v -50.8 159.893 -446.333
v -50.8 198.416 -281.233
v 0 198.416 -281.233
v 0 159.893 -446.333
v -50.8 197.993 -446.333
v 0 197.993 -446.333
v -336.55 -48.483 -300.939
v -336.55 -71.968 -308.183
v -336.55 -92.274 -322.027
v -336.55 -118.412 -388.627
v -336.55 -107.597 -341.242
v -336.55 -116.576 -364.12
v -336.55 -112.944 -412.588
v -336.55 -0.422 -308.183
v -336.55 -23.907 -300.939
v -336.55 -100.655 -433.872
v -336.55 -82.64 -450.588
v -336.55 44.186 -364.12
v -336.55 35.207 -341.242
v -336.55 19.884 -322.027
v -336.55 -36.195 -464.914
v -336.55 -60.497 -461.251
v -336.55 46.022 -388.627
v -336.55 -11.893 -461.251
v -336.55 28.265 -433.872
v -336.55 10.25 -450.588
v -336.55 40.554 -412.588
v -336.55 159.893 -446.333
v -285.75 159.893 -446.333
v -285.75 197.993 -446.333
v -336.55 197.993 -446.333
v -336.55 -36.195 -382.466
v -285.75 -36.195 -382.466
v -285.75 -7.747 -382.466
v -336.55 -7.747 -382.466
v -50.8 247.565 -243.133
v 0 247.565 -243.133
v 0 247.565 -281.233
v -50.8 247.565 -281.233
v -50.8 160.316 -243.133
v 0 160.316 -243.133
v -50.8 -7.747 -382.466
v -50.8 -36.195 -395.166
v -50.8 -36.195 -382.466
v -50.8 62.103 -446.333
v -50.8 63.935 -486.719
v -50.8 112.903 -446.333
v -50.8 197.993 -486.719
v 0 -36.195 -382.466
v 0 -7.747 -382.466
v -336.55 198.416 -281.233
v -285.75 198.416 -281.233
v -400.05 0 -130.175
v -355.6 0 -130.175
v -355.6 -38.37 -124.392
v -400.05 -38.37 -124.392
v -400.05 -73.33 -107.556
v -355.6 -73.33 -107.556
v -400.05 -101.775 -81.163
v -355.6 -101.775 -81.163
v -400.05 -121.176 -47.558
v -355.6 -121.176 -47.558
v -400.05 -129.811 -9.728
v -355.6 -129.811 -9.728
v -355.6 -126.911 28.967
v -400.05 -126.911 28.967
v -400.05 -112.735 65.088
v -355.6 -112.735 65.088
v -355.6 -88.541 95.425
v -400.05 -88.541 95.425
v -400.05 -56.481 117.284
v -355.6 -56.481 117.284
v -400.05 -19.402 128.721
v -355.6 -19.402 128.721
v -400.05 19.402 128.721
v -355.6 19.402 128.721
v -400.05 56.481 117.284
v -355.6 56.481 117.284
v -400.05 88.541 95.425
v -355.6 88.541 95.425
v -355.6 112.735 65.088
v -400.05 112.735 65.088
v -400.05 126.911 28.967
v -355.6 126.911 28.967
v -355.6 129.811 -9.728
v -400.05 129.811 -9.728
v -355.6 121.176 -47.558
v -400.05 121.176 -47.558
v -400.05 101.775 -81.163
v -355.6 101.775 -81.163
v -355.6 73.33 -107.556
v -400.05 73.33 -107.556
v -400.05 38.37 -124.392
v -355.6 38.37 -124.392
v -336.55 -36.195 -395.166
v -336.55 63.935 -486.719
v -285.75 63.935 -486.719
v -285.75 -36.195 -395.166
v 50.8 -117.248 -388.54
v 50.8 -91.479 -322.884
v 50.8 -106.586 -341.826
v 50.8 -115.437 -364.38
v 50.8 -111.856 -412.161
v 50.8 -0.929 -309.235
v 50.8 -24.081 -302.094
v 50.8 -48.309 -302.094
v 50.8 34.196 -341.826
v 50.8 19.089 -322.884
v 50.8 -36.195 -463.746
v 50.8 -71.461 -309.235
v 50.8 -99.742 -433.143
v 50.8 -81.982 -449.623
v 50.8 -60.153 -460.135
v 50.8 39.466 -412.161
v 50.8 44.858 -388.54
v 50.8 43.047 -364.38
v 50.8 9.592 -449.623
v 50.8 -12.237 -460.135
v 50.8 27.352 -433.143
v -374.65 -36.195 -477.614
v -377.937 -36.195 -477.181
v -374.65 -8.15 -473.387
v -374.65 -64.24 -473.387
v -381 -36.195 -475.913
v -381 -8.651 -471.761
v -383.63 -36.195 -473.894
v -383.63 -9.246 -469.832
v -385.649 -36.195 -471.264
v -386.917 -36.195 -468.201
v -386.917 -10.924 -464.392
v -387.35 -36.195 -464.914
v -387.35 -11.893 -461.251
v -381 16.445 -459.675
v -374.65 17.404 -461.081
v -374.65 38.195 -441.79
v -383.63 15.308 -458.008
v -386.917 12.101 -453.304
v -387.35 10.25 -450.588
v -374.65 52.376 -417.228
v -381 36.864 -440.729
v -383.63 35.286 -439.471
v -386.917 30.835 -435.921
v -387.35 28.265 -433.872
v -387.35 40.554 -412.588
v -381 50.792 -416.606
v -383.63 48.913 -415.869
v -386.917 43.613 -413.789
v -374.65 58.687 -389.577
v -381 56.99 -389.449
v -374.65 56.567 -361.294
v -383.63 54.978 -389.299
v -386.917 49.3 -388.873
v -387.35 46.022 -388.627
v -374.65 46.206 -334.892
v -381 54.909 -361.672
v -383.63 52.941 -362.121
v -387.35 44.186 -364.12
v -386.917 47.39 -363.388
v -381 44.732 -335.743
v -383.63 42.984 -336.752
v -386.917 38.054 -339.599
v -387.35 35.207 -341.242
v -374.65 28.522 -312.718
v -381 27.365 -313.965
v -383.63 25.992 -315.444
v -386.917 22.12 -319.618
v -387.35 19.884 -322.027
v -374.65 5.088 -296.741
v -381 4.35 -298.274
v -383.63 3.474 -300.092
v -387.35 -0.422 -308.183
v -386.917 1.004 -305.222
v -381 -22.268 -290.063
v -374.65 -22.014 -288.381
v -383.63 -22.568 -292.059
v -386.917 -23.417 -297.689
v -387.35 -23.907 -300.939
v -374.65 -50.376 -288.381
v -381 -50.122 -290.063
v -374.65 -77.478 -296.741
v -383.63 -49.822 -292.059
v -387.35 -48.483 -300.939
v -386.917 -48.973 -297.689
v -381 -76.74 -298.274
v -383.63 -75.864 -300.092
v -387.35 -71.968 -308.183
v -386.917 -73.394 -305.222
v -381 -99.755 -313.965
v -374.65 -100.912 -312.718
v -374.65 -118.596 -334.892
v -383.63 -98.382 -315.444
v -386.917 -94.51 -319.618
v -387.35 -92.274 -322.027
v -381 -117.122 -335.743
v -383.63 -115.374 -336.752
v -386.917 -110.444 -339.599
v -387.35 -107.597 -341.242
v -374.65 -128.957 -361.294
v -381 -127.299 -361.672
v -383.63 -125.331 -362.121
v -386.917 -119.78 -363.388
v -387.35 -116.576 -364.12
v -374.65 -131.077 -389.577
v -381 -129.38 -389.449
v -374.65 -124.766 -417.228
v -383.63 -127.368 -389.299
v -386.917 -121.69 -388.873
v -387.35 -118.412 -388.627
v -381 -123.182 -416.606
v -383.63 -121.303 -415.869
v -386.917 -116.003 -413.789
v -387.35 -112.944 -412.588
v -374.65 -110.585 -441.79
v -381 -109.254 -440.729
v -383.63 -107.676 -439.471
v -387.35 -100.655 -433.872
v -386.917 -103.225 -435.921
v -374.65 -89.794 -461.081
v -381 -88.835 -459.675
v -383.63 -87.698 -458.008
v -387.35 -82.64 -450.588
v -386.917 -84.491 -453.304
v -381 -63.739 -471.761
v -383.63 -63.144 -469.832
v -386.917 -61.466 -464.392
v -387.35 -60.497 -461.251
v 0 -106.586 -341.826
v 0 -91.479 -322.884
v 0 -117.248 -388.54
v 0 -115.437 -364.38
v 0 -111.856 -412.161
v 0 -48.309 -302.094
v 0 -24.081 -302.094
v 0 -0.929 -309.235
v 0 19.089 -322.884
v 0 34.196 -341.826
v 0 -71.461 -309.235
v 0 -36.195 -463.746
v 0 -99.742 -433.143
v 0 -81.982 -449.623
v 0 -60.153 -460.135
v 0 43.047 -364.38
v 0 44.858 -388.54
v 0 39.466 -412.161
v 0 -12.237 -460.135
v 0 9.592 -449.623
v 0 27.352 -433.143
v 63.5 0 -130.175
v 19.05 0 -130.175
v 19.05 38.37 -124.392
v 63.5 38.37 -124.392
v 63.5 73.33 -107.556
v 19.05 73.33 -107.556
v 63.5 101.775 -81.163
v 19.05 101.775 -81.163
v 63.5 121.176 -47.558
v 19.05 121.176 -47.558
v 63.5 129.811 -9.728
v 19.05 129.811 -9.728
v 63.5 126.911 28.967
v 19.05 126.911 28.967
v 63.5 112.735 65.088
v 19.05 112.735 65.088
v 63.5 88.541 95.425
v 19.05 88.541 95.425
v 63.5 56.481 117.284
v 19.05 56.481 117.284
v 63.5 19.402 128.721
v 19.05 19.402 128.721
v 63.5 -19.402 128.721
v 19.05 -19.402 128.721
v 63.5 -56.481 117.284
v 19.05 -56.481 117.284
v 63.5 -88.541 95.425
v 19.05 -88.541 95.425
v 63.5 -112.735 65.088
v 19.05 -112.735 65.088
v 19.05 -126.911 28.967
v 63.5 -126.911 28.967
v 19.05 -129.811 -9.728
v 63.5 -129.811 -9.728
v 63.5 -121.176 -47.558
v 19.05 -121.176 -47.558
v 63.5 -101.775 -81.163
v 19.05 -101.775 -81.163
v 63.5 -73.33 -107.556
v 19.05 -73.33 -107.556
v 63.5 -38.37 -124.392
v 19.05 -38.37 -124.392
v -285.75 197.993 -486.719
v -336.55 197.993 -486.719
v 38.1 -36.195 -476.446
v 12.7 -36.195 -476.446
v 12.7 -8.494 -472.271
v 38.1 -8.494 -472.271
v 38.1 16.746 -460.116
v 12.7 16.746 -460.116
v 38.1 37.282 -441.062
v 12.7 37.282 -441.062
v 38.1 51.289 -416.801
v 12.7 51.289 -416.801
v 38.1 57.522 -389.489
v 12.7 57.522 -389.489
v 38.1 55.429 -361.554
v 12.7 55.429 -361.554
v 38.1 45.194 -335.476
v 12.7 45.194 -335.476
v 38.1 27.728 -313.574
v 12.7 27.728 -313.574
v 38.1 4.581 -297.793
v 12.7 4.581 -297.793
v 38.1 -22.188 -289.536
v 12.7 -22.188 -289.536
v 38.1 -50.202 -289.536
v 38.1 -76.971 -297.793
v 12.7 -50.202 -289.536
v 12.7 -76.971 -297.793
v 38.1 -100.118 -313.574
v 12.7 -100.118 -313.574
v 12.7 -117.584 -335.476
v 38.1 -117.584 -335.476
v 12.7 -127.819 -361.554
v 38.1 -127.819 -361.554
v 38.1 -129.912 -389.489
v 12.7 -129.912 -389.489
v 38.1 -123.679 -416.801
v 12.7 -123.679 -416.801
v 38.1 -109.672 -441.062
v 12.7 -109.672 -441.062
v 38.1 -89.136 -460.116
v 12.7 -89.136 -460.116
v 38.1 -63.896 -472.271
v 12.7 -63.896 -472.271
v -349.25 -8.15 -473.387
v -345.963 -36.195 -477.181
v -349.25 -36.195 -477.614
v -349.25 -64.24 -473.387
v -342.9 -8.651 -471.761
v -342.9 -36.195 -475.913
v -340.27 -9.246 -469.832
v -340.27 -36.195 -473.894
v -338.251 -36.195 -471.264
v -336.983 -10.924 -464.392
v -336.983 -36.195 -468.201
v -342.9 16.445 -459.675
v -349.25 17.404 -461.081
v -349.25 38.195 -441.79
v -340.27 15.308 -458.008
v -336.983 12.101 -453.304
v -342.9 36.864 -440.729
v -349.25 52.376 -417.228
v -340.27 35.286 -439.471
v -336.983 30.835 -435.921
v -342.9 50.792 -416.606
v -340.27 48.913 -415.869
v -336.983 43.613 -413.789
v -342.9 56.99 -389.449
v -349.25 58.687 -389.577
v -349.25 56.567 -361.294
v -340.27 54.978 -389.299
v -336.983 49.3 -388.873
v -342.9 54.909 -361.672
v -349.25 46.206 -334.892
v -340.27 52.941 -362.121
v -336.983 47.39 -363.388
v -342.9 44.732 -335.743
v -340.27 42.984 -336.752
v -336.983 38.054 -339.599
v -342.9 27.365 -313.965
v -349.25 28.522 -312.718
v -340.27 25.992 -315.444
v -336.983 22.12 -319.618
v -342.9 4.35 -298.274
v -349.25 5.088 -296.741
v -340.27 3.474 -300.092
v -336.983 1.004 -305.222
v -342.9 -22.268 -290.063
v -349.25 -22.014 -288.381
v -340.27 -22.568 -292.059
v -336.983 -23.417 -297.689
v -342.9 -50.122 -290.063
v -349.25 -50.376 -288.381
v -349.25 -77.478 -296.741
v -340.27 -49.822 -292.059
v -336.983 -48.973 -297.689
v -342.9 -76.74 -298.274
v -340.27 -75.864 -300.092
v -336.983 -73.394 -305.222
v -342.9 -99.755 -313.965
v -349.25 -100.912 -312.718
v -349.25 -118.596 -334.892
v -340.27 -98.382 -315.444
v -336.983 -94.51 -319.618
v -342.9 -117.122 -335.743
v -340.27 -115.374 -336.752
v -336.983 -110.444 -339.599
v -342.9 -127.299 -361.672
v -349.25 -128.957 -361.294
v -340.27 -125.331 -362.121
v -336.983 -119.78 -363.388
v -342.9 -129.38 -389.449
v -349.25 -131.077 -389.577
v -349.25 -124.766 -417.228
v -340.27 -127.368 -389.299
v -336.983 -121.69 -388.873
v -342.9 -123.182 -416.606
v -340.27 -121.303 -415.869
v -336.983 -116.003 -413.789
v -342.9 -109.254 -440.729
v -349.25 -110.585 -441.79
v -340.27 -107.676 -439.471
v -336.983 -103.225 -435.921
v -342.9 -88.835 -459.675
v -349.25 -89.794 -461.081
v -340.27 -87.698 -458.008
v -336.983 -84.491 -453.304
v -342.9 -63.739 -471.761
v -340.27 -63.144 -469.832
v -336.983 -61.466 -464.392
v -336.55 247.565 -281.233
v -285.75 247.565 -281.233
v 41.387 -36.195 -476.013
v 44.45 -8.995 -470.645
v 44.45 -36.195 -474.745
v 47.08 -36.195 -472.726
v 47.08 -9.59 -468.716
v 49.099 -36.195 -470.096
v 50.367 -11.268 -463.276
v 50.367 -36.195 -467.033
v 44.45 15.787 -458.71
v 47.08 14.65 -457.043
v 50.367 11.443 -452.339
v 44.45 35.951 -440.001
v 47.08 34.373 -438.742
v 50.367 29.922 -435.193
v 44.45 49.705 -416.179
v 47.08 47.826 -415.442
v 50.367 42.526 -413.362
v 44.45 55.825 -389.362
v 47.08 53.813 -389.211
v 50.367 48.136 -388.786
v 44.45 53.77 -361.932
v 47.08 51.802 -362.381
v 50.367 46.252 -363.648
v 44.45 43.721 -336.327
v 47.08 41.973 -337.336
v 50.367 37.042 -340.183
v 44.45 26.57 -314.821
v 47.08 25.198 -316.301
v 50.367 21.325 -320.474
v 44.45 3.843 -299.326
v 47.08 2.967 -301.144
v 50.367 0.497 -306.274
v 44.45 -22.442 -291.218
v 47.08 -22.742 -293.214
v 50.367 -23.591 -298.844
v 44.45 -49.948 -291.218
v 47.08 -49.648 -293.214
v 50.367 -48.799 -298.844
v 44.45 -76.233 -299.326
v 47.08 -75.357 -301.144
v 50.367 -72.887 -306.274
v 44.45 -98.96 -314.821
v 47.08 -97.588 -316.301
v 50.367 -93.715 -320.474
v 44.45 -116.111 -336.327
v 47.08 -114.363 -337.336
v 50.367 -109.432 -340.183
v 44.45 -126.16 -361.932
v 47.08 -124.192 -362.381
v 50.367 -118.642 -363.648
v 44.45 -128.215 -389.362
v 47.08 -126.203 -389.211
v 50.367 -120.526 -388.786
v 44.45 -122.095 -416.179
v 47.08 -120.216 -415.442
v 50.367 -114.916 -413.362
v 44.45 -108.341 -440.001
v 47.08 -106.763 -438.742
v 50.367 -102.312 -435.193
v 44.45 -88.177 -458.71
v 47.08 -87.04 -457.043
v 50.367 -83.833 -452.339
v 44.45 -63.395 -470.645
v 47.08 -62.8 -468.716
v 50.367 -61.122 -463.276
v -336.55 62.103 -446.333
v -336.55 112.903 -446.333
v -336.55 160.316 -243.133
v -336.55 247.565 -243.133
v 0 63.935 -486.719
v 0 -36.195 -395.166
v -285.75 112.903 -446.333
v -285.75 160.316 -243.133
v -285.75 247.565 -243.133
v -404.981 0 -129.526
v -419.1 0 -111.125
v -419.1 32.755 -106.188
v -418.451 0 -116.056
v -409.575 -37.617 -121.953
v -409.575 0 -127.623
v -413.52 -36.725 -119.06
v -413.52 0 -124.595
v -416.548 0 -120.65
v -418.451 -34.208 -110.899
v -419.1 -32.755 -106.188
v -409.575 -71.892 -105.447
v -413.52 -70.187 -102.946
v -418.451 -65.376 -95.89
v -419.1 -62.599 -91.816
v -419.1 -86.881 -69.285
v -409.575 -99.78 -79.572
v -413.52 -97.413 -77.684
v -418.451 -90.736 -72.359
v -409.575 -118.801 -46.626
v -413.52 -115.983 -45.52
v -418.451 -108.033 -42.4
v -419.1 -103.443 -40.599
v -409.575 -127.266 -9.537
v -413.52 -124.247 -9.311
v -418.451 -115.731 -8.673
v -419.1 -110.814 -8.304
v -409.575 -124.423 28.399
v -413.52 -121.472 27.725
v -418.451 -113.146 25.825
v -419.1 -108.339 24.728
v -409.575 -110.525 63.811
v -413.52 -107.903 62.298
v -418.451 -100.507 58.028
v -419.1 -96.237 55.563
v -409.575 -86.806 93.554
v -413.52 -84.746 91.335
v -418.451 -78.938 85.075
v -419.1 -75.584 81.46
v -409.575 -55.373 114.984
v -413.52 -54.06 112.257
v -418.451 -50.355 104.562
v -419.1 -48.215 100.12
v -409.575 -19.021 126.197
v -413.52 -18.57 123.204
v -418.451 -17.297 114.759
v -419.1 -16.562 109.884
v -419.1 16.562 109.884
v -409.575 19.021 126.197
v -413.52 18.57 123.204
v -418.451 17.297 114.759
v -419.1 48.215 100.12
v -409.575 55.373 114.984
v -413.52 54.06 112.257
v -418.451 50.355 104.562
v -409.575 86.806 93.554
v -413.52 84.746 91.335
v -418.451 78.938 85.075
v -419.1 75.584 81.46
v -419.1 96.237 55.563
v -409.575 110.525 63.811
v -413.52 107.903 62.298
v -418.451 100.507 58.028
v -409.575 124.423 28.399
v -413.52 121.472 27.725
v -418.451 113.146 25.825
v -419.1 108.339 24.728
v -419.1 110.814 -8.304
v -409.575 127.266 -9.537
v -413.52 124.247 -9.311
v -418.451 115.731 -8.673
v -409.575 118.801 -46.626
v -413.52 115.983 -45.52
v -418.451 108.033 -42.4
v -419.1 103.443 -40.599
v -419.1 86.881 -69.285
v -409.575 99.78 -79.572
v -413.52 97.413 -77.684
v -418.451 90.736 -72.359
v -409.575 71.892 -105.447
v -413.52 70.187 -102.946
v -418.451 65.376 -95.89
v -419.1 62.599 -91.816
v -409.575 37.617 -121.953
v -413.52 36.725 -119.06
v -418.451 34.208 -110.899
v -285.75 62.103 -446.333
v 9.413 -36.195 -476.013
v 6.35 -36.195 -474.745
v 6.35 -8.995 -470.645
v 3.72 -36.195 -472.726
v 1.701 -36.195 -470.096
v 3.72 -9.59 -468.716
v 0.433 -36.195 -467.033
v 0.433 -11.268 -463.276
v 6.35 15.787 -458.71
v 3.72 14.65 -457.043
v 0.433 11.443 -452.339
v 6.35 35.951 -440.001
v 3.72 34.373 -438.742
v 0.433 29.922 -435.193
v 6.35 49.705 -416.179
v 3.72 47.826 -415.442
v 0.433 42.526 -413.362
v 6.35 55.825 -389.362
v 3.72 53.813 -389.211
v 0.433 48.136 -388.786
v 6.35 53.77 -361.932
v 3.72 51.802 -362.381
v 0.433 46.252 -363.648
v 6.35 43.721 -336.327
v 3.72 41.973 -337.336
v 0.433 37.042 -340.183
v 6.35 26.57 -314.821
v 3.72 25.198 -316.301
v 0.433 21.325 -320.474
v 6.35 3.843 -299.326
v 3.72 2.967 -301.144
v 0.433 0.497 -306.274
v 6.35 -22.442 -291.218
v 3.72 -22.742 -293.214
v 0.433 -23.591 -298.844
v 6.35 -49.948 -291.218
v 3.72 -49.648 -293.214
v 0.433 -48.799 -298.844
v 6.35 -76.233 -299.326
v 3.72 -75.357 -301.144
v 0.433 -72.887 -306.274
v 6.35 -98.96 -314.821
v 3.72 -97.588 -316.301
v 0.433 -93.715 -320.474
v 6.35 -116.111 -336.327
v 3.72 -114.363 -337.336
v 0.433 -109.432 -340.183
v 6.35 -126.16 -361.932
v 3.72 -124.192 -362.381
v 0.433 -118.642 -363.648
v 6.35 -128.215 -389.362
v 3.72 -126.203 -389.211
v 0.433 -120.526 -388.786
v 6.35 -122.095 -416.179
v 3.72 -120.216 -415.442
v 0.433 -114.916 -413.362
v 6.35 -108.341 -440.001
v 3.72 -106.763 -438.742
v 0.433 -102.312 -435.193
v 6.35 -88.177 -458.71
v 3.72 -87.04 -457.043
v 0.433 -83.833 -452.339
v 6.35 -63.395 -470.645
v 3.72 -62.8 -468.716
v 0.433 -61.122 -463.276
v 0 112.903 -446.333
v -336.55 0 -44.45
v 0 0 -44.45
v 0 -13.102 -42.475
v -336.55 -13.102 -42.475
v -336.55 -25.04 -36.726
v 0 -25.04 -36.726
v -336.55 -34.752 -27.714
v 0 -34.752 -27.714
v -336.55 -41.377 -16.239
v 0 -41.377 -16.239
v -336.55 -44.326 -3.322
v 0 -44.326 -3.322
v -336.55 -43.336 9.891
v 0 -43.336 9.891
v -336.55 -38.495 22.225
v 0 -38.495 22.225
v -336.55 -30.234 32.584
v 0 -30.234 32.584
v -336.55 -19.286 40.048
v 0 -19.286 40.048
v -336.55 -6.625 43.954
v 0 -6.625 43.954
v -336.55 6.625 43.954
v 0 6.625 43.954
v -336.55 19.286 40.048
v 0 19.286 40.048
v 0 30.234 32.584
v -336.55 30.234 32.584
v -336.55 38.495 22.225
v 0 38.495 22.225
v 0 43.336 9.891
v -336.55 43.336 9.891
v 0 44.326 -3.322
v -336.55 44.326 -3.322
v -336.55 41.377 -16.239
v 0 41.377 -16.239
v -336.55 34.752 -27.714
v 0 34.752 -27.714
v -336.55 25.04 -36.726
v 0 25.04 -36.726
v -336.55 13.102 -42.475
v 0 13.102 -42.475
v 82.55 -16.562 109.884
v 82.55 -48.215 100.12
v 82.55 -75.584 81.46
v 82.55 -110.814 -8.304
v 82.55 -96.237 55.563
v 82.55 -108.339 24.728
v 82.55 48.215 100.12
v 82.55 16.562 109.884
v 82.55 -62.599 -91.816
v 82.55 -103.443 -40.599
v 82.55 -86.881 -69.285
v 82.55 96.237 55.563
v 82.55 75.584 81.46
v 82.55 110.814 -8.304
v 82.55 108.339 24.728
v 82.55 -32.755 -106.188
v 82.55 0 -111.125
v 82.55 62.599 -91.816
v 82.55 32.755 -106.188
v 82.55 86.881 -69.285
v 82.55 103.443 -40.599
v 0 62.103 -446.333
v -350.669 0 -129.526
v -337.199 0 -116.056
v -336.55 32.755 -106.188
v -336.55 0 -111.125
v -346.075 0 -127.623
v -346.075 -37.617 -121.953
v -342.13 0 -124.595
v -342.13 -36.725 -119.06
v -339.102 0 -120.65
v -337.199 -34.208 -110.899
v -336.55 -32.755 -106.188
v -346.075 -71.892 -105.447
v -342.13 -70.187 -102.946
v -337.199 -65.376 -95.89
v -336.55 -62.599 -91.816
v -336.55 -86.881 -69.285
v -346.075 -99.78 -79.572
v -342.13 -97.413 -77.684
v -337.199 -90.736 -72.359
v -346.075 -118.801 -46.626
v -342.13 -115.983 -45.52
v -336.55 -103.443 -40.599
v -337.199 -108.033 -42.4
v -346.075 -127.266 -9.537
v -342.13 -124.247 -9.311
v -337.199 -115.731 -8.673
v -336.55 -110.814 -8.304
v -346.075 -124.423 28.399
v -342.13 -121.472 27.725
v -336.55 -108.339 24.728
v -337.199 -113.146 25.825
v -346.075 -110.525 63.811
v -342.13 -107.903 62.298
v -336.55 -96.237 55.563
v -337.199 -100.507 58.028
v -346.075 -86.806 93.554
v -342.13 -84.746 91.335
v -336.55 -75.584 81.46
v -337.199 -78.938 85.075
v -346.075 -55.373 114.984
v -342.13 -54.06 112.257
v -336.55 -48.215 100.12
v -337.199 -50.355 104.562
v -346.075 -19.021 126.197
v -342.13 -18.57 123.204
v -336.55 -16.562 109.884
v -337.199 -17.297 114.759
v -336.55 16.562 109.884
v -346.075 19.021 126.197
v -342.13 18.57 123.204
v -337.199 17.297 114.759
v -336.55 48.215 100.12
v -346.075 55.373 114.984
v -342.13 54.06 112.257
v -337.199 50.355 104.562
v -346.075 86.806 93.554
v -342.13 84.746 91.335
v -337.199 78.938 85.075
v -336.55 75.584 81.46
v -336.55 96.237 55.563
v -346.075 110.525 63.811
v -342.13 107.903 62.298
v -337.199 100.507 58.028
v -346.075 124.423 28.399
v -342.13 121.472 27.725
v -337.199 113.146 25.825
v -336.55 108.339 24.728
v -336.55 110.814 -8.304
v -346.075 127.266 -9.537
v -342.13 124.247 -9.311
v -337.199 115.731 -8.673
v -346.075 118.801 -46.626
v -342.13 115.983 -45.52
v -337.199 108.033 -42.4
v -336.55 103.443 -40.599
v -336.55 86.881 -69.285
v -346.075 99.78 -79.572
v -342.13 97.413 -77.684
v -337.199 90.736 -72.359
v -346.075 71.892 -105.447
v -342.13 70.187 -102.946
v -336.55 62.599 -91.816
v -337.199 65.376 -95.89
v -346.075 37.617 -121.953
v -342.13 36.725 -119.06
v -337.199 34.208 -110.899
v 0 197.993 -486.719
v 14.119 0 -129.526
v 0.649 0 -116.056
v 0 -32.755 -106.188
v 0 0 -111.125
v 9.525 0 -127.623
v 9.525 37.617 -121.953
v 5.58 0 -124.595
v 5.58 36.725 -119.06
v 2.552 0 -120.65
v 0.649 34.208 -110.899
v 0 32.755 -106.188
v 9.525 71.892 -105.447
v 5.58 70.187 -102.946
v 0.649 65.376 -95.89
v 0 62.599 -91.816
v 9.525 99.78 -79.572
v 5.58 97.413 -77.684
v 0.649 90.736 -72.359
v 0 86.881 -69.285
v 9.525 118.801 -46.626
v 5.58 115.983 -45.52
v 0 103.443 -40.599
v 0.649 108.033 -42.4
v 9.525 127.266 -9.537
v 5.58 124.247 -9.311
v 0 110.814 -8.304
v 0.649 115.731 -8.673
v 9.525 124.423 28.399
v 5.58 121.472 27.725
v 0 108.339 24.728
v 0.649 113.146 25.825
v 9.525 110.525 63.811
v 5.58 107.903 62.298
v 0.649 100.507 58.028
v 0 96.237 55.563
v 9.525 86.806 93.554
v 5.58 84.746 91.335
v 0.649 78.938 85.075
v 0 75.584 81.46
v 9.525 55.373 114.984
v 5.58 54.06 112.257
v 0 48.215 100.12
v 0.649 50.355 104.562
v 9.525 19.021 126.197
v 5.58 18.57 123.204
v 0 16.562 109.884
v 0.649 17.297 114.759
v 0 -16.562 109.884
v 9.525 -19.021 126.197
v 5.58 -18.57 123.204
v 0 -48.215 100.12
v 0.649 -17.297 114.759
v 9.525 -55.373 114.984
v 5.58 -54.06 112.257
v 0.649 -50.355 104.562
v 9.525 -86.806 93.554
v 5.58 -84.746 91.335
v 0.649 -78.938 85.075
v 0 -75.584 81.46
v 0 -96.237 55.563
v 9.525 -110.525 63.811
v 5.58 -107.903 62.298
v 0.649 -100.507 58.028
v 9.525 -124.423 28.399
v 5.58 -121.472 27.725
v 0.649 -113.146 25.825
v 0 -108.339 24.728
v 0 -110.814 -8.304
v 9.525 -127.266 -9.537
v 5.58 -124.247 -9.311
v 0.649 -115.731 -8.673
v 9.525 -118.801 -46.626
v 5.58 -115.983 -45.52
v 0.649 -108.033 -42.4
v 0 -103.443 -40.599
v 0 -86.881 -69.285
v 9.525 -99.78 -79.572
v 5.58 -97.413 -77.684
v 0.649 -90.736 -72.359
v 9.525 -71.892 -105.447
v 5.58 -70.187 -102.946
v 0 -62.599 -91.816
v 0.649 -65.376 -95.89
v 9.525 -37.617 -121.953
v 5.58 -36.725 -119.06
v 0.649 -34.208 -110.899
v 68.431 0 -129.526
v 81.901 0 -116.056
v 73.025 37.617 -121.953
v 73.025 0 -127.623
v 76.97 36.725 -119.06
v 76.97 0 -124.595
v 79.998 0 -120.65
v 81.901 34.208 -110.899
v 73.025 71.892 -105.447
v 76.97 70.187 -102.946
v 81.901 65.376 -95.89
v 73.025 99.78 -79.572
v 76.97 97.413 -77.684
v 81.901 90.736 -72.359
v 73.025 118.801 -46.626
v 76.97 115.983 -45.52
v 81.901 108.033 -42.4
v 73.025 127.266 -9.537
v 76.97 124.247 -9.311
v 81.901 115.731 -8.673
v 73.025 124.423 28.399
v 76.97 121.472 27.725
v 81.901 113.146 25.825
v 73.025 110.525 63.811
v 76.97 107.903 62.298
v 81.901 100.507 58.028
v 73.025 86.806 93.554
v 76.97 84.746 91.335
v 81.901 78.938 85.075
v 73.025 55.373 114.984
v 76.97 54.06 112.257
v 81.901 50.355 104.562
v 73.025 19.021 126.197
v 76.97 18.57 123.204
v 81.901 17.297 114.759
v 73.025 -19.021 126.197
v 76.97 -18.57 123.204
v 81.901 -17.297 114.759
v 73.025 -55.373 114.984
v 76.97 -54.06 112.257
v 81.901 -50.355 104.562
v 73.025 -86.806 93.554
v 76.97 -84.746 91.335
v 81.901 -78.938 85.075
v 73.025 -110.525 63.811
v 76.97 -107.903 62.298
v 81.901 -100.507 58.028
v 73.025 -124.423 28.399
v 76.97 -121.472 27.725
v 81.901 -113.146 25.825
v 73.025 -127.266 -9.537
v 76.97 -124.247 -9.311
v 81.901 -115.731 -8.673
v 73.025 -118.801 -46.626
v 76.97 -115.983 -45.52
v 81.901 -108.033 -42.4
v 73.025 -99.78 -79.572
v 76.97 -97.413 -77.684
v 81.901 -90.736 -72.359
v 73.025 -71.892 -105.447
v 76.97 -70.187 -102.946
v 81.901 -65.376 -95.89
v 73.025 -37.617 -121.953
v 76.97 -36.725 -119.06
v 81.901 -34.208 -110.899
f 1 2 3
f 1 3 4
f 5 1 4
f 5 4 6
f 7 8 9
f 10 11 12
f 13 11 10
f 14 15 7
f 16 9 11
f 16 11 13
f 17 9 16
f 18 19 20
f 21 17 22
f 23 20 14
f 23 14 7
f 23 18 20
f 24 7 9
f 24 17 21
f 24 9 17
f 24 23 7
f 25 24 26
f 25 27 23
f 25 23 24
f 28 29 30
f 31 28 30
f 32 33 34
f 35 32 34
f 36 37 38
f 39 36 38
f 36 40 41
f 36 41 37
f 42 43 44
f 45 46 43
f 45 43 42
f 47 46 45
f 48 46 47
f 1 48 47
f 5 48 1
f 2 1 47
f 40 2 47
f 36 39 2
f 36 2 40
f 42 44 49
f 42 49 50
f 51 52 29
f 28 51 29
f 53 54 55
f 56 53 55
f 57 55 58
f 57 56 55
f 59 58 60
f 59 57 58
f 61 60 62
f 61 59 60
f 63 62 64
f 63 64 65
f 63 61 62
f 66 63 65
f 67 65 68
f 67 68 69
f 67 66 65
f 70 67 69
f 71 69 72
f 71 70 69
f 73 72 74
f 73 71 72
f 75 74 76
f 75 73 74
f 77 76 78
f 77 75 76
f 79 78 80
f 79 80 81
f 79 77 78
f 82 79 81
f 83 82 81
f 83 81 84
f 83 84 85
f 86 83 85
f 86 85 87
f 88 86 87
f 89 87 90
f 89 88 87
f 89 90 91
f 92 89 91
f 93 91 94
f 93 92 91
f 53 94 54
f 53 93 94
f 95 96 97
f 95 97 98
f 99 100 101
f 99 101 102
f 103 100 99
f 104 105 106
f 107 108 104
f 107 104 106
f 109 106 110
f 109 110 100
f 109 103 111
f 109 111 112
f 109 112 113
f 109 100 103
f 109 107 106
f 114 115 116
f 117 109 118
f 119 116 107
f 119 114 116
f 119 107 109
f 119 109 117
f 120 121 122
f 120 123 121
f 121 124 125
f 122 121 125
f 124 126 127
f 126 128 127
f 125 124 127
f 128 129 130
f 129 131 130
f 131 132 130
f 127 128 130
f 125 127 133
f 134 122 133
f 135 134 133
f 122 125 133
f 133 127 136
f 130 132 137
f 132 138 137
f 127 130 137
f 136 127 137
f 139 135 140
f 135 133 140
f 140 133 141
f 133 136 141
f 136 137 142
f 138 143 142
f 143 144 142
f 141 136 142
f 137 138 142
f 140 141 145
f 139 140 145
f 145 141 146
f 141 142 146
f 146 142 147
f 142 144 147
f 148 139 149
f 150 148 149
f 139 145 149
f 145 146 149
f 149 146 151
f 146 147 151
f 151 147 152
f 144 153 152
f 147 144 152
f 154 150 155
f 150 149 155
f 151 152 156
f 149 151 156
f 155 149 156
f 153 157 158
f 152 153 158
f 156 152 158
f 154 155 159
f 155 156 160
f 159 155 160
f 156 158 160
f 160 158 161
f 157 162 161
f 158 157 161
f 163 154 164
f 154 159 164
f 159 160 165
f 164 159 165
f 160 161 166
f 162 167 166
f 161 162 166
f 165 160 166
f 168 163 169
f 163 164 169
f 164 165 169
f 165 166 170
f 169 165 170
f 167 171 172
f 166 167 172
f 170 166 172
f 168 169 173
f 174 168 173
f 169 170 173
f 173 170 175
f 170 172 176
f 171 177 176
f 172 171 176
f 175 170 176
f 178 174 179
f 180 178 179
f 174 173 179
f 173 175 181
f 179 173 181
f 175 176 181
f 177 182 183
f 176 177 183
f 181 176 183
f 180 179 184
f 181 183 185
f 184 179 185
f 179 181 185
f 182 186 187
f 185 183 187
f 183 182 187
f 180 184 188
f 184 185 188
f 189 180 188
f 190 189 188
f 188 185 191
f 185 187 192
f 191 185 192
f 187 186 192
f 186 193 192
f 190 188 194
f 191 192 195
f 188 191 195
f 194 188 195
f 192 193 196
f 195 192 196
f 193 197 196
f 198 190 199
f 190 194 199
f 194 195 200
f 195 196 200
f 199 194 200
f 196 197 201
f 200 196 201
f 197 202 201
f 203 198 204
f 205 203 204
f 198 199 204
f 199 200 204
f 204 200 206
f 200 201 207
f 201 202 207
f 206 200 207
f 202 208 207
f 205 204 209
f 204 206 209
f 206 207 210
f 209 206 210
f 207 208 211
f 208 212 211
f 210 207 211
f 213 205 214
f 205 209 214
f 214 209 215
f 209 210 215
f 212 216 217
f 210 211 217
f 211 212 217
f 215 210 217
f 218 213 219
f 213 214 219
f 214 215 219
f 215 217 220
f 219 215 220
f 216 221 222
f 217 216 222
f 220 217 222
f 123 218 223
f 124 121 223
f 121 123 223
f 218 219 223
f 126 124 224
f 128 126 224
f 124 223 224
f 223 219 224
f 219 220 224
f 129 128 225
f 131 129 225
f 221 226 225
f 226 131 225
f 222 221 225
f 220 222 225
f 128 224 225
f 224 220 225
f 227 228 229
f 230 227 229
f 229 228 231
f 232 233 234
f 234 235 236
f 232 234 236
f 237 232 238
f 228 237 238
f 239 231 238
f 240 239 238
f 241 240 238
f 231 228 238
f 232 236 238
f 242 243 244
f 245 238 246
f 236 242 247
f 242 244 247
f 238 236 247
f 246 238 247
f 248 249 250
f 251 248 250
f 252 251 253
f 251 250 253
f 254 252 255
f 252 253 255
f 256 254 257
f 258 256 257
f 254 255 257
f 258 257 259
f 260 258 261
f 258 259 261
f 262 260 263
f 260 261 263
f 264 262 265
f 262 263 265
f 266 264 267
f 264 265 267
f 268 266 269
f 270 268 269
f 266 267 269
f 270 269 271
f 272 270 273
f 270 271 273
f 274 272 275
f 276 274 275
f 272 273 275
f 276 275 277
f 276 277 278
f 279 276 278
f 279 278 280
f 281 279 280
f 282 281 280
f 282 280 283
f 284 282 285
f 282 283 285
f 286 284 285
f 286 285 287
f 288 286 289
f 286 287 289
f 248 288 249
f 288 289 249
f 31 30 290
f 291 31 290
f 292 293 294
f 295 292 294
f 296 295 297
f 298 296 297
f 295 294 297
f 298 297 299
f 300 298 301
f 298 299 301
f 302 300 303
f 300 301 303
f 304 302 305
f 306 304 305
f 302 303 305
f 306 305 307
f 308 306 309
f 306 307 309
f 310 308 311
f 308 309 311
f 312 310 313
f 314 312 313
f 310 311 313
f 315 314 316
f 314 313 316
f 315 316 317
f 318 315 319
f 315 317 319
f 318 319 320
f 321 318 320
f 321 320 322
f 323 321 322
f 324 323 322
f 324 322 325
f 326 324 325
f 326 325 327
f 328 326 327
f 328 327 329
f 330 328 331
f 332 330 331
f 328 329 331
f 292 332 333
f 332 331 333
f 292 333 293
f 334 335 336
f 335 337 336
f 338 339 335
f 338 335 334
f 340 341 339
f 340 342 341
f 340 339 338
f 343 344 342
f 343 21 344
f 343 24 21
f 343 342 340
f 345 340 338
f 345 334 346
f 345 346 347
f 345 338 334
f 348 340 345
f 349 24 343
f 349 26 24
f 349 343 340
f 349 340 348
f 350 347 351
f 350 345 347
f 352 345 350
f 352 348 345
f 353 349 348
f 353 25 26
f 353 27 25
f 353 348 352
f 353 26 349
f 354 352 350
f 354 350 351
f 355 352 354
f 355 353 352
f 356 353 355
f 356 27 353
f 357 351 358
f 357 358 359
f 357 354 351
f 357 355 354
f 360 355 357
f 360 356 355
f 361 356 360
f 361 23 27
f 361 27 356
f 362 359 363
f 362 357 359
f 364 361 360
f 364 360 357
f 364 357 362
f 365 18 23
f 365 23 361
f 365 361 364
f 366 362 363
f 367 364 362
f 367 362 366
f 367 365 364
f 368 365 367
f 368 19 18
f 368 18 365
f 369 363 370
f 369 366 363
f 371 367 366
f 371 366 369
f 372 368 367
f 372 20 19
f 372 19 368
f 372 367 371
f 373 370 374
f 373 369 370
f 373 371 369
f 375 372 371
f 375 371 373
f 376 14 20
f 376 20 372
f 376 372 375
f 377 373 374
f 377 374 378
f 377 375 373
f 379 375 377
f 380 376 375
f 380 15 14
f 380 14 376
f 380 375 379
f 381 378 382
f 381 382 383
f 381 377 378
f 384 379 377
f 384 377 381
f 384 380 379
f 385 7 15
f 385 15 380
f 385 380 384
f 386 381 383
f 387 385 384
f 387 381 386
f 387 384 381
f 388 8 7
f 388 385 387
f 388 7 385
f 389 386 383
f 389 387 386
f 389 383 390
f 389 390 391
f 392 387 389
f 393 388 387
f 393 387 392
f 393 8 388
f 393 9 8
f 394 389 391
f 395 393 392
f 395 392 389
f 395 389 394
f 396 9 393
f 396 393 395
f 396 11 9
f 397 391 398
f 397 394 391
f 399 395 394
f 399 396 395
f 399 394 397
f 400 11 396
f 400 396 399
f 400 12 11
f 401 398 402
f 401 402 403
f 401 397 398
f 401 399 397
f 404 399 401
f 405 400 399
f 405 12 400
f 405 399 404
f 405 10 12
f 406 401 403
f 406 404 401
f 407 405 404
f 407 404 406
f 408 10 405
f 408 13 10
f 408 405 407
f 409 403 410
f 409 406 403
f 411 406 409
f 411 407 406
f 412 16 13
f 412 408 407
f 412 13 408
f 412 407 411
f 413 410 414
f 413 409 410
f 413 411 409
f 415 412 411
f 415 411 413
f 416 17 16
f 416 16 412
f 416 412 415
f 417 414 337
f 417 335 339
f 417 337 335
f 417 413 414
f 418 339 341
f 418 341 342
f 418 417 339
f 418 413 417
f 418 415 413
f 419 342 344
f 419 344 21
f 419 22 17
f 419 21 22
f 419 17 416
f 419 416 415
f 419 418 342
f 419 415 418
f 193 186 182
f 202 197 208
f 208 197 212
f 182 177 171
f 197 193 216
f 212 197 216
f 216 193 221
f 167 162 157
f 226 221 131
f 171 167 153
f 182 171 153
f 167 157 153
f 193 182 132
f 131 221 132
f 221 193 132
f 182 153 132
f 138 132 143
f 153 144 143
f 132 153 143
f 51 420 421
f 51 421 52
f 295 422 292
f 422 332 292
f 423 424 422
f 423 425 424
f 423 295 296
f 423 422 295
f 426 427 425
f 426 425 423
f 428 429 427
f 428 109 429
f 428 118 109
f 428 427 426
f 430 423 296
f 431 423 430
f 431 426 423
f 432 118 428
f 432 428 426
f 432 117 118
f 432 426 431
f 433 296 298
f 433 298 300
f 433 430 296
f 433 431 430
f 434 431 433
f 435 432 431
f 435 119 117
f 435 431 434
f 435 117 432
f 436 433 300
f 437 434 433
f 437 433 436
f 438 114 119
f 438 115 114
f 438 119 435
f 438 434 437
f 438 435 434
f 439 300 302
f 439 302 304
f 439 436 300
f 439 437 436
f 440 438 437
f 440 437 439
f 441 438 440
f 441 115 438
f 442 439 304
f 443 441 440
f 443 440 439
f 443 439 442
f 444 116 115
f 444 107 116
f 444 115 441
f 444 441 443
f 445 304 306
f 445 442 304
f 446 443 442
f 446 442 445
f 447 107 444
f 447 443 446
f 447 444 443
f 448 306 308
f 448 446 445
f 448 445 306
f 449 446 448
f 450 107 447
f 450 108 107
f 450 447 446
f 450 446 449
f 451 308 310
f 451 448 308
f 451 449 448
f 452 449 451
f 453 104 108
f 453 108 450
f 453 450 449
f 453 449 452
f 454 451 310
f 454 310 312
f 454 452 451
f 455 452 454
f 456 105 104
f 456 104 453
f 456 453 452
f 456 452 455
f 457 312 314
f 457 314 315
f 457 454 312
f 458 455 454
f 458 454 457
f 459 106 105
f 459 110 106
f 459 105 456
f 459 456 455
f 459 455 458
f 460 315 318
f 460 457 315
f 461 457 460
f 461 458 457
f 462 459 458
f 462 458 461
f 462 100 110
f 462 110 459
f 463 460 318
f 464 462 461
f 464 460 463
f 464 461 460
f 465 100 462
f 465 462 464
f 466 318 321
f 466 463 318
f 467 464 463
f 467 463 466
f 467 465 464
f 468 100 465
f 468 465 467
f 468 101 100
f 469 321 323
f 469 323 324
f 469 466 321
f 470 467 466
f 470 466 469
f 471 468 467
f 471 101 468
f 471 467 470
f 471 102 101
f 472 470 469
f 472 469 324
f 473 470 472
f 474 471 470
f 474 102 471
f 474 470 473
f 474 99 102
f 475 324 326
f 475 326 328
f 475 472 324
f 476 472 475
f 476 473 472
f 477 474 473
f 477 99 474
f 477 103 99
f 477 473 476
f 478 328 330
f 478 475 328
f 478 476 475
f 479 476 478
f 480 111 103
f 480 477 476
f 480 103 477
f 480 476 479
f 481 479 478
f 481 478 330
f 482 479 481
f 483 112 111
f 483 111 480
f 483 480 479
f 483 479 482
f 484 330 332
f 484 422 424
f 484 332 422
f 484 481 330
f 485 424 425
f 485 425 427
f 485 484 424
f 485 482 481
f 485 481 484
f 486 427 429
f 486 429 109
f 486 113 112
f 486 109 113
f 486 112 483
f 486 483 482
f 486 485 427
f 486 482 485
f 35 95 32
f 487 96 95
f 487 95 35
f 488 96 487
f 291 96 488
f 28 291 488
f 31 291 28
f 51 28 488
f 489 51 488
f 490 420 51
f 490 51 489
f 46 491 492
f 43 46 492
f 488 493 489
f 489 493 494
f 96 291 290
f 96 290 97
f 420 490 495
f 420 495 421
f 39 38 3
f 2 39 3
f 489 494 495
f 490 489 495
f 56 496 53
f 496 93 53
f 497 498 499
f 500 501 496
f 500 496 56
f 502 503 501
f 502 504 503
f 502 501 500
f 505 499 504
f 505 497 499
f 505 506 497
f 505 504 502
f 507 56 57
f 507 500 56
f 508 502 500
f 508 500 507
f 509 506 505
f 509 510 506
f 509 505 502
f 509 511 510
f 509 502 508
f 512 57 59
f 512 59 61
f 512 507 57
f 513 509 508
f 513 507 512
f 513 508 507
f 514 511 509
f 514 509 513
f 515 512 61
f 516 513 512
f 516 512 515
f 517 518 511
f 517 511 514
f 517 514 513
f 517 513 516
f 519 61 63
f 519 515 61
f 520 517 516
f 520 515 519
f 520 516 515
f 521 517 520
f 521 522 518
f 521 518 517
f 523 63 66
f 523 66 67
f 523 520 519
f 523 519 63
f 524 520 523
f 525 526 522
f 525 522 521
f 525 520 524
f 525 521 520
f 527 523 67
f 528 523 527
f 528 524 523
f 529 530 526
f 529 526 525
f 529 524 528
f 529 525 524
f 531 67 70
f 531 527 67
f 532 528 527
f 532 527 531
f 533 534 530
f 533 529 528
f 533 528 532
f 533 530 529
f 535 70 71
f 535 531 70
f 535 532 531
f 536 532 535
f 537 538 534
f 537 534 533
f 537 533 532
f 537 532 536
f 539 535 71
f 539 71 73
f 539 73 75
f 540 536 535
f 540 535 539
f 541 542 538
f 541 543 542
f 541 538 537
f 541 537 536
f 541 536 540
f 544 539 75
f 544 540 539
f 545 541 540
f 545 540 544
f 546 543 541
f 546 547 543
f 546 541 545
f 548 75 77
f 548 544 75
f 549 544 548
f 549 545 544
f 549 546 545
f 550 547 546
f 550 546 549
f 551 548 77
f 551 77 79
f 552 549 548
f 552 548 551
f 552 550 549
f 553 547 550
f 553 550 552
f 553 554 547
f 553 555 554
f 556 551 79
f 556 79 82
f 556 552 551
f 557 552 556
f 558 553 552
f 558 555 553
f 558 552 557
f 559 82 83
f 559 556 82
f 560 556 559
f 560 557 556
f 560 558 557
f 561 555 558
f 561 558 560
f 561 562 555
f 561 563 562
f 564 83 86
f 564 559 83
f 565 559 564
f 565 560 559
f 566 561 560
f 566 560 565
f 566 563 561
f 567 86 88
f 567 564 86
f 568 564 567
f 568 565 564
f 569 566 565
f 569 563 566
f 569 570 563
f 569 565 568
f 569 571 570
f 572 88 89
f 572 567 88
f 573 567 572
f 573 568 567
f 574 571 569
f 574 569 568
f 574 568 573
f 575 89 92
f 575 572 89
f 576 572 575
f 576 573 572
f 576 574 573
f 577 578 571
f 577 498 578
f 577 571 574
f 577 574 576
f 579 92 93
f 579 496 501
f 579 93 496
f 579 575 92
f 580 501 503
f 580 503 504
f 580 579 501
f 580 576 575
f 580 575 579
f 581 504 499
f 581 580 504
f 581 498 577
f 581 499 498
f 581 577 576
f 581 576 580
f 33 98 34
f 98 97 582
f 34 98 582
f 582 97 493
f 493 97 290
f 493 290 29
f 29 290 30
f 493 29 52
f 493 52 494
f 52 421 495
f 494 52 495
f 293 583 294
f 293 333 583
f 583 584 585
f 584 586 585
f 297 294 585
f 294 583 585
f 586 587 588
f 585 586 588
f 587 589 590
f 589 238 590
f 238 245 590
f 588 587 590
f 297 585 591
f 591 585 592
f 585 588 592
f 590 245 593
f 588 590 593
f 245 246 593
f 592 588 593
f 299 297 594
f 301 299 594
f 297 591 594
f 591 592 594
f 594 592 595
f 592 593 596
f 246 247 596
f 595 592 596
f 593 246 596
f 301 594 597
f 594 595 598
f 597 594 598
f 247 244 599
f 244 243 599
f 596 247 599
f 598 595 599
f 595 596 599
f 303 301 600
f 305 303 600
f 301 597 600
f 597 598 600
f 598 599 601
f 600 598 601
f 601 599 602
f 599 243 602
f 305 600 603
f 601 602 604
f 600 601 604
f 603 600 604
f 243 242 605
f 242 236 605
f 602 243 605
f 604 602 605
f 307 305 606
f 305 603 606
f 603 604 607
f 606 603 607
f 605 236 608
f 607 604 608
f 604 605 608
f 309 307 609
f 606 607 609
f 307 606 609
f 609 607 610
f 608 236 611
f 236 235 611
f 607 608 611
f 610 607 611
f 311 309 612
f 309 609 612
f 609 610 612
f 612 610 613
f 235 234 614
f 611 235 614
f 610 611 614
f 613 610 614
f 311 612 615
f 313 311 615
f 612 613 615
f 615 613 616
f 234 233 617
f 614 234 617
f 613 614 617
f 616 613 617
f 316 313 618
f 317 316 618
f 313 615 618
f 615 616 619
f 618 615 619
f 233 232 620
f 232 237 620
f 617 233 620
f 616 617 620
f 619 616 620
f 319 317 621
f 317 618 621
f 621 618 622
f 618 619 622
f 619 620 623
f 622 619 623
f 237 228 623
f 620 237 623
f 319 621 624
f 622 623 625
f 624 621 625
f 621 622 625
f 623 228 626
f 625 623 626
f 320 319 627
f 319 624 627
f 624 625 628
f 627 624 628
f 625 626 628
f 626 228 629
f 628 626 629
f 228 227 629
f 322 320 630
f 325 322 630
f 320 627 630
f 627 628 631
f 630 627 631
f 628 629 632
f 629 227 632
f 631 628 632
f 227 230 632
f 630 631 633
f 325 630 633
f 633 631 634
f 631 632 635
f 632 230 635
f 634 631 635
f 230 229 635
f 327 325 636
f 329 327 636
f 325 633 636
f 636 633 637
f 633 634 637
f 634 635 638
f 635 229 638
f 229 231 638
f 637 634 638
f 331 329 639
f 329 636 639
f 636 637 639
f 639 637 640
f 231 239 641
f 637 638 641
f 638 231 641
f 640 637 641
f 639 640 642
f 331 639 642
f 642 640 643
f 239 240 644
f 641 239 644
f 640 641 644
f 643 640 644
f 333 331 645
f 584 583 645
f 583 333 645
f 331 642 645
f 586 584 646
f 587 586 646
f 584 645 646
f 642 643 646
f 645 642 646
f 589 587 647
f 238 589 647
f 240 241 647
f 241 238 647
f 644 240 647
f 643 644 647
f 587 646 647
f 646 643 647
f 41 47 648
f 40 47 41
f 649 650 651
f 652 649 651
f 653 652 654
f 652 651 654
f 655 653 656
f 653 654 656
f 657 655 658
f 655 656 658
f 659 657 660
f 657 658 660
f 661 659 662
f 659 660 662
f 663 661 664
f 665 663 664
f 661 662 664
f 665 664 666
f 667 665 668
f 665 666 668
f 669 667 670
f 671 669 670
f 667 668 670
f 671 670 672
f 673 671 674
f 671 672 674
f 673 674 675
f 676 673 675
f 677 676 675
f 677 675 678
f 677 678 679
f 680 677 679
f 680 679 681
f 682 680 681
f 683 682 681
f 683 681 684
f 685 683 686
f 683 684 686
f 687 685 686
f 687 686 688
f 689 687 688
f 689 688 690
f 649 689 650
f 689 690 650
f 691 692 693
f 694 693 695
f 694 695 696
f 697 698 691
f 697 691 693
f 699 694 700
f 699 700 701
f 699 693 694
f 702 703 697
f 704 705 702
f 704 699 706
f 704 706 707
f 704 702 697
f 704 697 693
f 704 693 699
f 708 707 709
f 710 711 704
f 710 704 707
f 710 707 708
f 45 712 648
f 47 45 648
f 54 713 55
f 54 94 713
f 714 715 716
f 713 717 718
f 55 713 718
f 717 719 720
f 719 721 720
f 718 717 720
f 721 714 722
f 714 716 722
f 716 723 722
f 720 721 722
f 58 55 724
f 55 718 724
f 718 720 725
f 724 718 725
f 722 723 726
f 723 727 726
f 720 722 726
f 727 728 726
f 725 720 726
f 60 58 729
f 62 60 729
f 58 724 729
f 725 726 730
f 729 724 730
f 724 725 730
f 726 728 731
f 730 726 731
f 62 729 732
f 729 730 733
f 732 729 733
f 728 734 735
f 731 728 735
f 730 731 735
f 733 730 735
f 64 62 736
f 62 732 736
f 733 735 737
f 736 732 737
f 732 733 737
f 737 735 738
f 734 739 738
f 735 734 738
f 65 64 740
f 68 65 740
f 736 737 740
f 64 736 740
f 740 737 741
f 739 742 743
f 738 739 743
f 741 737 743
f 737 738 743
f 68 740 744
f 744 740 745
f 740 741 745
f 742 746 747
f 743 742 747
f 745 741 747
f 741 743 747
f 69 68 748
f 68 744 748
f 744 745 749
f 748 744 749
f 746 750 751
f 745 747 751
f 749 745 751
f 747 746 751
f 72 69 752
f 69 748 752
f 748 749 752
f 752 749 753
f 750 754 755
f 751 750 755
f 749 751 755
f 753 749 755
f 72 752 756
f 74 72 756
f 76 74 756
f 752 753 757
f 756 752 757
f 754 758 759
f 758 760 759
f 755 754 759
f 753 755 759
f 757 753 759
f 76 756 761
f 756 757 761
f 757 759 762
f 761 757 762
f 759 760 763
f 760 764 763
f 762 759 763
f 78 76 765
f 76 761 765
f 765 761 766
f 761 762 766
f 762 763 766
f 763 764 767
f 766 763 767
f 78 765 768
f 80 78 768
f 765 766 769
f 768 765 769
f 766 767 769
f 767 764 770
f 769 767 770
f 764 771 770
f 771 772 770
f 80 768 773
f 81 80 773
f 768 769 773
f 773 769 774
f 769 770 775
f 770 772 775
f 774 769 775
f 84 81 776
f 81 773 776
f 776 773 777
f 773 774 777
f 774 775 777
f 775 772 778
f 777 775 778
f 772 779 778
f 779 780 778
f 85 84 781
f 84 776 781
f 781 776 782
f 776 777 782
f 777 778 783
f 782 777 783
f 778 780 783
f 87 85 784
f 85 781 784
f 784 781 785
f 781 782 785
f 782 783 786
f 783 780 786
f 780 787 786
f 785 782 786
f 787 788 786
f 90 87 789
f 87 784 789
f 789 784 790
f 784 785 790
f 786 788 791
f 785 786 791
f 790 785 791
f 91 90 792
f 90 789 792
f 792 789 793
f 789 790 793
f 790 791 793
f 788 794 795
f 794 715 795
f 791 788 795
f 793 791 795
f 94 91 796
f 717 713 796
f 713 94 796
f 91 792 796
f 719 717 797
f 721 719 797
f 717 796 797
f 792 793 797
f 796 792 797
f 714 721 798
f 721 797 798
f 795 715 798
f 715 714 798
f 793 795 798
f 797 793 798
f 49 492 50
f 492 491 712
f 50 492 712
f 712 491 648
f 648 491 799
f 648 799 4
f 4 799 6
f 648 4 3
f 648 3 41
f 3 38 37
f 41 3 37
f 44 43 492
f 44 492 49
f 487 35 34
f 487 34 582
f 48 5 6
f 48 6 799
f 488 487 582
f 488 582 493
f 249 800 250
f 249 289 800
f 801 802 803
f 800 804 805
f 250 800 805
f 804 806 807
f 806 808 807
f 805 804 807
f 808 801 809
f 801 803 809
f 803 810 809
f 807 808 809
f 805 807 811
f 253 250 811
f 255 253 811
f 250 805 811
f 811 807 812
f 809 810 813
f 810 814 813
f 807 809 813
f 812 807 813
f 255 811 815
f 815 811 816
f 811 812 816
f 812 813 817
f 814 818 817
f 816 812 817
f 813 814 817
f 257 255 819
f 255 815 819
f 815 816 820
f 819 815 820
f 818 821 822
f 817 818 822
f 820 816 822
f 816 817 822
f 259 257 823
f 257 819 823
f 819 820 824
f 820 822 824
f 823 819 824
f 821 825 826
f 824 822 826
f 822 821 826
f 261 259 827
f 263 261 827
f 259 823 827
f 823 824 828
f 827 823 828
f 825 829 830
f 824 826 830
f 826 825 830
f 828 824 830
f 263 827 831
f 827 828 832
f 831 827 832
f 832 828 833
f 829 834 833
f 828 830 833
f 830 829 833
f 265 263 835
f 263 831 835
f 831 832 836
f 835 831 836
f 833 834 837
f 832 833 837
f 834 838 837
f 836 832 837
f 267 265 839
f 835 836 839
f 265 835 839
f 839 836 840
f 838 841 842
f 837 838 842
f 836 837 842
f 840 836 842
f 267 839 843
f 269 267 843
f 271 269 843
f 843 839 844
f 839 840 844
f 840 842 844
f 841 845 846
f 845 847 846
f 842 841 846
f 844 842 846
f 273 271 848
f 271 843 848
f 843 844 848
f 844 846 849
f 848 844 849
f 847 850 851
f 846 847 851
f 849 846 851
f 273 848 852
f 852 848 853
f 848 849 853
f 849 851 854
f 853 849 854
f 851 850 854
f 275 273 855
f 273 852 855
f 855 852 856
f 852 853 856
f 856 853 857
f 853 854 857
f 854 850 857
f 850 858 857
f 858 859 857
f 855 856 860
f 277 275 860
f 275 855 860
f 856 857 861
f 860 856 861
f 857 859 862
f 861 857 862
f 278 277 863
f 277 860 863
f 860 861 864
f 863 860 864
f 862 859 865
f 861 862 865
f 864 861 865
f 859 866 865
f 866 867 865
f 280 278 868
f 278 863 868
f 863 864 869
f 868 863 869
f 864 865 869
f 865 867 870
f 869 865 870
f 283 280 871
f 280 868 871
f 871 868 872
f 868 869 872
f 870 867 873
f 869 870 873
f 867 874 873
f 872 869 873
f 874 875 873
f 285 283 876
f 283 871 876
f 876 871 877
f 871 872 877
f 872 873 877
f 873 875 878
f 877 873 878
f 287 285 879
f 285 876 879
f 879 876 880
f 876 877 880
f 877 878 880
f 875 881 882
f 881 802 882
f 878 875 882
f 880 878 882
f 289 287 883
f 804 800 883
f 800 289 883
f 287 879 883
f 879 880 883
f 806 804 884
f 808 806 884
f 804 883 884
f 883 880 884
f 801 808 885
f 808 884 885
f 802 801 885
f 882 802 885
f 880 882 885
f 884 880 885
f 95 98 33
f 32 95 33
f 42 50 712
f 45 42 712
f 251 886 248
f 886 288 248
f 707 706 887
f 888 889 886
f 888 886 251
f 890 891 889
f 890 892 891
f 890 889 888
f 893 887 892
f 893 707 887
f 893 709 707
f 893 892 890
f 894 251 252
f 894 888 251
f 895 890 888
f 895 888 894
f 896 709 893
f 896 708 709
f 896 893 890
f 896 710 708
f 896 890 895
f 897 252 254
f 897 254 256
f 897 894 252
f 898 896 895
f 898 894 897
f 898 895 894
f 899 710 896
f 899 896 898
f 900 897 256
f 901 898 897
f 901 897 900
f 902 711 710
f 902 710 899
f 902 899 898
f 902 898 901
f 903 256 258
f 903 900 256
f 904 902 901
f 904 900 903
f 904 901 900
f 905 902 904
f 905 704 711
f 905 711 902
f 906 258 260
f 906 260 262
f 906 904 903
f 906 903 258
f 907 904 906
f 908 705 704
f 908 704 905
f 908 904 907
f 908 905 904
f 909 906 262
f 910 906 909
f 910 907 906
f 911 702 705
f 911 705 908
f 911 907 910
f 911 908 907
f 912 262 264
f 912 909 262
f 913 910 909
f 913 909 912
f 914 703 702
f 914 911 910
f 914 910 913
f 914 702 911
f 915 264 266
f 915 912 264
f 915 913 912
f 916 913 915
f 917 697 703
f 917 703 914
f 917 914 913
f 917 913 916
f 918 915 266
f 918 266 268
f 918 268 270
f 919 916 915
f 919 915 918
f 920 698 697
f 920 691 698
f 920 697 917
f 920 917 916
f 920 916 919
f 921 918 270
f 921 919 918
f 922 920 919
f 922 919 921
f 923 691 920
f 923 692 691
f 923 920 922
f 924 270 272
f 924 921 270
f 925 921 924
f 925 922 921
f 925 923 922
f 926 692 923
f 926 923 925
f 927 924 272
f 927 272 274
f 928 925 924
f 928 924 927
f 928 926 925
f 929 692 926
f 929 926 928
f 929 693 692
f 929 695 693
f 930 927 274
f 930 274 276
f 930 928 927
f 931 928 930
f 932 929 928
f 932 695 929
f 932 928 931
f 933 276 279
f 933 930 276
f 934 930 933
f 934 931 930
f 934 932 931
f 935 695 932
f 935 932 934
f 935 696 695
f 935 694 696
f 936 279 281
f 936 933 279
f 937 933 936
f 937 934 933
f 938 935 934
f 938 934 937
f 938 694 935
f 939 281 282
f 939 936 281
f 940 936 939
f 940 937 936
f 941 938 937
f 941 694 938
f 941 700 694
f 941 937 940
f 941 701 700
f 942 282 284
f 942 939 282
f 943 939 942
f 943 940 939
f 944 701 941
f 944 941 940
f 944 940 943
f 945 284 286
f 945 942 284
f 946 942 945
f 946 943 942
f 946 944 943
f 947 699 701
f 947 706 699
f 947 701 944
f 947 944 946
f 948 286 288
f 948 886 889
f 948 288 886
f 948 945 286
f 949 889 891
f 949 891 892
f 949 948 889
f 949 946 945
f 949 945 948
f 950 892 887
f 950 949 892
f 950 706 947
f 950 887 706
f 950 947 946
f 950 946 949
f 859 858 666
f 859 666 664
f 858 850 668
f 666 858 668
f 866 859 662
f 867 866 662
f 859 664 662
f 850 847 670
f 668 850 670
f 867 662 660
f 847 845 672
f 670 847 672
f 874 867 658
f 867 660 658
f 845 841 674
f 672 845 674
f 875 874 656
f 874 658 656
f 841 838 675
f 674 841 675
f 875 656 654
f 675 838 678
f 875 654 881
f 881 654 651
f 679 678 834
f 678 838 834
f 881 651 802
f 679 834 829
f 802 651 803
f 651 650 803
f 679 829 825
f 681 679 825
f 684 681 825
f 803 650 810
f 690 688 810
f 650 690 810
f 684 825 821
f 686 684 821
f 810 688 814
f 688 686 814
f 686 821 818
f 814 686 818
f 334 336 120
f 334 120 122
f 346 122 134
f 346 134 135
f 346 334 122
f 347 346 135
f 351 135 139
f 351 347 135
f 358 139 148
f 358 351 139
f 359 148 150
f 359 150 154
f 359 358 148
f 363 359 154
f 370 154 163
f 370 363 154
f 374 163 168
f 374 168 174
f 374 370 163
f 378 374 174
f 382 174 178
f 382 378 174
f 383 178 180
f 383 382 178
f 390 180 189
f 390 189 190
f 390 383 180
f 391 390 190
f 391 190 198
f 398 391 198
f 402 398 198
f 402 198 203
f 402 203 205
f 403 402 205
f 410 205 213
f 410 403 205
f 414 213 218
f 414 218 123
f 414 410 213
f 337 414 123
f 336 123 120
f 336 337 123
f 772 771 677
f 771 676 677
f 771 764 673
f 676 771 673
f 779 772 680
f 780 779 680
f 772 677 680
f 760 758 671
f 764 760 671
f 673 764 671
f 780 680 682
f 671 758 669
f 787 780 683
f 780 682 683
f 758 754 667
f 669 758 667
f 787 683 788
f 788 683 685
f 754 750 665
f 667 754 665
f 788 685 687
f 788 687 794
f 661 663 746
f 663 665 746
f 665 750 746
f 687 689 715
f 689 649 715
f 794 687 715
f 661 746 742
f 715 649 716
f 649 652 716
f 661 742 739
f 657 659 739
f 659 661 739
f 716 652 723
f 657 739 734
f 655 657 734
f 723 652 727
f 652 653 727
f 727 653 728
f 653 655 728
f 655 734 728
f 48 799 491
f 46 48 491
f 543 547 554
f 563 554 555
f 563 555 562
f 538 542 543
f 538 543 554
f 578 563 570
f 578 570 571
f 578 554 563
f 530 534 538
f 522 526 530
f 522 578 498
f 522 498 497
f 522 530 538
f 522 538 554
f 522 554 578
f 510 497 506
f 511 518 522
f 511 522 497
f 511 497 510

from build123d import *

# Parameters (mm, degrees)
SKETCH2_R           = 130.175
BOSS_EXTRUDE1_DEPTH = 82.55
FILLET1_R           = 19.05
SKETCH3_R           = 44.45
BOSS_EXTRUDE2_DEPTH = 336.55
BOSS_EXTRUDE3_START = 82.55
SKETCH4_R           = 130.175
BOSS_EXTRUDE3_DEPTH = 82.55
FILLET3_R           = 19.05
SKETCH5_R           = 93.98
BOSS_EXTRUDE5_DEPTH = 50.8
FILLET4_R           = 12.7
SKETCH9_R           = 95.147991529
BOSS_EXTRUDE7_DEPTH = 50.8
FILLET5_R           = 12.7
BOSS_EXTRUDE8_DEPTH = 50.8
BOSS_EXTRUDE9_DEPTH = 50.8


with BuildPart() as part:
    # Sketch2 → Boss-Extrude1 (new body)
    with BuildSketch(Plane(origin=(0, 0, 0), x_dir=(0, 0, -1), z_dir=(1, 0, 0))):
        Circle(SKETCH2_R)
    extrude(amount=BOSS_EXTRUDE1_DEPTH)

    # Fillet1
    fillet1_edges = [part.edges().sort_by_distance(p)[0] for p in [
        (0, 0, 130.175),
        (82.55, 0, 130.175),
    ]]
    fillet(fillet1_edges, radius=FILLET1_R)

    # Sketch3 → Boss-Extrude2 (add)
    with BuildSketch(Plane.ZY):
        with Locations(Location((0, 0, 0), (0, 0, 180))):
            Circle(SKETCH3_R)
    extrude(amount=BOSS_EXTRUDE2_DEPTH)

    # Sketch4 → Boss-Extrude3 (add)
    with BuildSketch(Plane.ZY.offset(336.55).offset(BOSS_EXTRUDE3_START)):
        with Locations(Location((0, 0, 0), (0, 0, 180))):
            Circle(SKETCH4_R)
    extrude(amount=-BOSS_EXTRUDE3_DEPTH)

    # Fillet3
    fillet3_edges = [part.edges().sort_by_distance(p)[0] for p in [
        (-336.55, 0, 130.175),
        (-419.1, 0, 130.175),
    ]]
    fillet(fillet3_edges, radius=FILLET3_R)


with BuildPart() as body_2:
    # Sketch5 → Boss-Extrude5 (new body)
    with BuildSketch(Plane(origin=(0, 0, 0), x_dir=(0, 0, -1), z_dir=(1, 0, 0))):
        with Locations((382.466145691, -36.195)):
            Circle(SKETCH5_R)
    extrude(amount=BOSS_EXTRUDE5_DEPTH)

    # Fillet4
    fillet4_edges = [body_2.edges().sort_by_distance(p)[0] for p in [
        (0, -36.195, -288.486145691),
        (50.8, -36.195, -288.486145691),
    ]]
    fillet(fillet4_edges, radius=FILLET4_R)


with BuildPart() as body_3:
    # Sketch9 → Boss-Extrude7 (new body)
    with BuildSketch(Plane(origin=(-336.55, 0, 0), x_dir=(0, 0, -1), z_dir=(1, 0, 0))):
        with Locations((382.466145691, -36.195)):
            Circle(SKETCH9_R)
    extrude(amount=-BOSS_EXTRUDE7_DEPTH)

    # Fillet5
    fillet5_edges = [body_3.edges().sort_by_distance(p)[0] for p in [
        (-336.55, -36.195, -287.318154163),
        (-387.35, -36.195, -287.318154163),
    ]]
    fillet(fillet5_edges, radius=FILLET5_R)


with BuildPart() as body_4:
    # Sketch10 → Boss-Extrude8 (new body)
    with BuildSketch(Plane(origin=(-336.55, 0, 0), x_dir=(0, 0, -1), z_dir=(1, 0, 0))):
        Polygon((382.466145691, -36.195), (382.466145691, -7.747), (446.333339345, 62.103), (446.333339345, 197.993), (486.719339345, 197.993), (486.719339345, 63.934506416), (395.166145691, -36.195), align=None)
    extrude(amount=BOSS_EXTRUDE8_DEPTH)

    # Sketch11 → Boss-Extrude9 (add)
    with BuildSketch(Plane(origin=(-285.75, 0, 0), x_dir=(0, 0, -1), z_dir=(1, 0, 0))):
        Polygon((446.333339345, 112.903), (243.133339345, 160.316333333), (243.133339345, 247.565333333), (281.233339345, 247.565333333), (281.233339345, 198.416333333), (446.333339345, 159.893), align=None)
    extrude(amount=-BOSS_EXTRUDE9_DEPTH)


with BuildPart() as body_5:
    # Mirror15: mirrored copy
    add(body_4.part.mirror(Plane.ZY.offset(168.275)))


solid = Compound([part.part, body_2.part, body_3.part, body_4.part, body_5.part])
